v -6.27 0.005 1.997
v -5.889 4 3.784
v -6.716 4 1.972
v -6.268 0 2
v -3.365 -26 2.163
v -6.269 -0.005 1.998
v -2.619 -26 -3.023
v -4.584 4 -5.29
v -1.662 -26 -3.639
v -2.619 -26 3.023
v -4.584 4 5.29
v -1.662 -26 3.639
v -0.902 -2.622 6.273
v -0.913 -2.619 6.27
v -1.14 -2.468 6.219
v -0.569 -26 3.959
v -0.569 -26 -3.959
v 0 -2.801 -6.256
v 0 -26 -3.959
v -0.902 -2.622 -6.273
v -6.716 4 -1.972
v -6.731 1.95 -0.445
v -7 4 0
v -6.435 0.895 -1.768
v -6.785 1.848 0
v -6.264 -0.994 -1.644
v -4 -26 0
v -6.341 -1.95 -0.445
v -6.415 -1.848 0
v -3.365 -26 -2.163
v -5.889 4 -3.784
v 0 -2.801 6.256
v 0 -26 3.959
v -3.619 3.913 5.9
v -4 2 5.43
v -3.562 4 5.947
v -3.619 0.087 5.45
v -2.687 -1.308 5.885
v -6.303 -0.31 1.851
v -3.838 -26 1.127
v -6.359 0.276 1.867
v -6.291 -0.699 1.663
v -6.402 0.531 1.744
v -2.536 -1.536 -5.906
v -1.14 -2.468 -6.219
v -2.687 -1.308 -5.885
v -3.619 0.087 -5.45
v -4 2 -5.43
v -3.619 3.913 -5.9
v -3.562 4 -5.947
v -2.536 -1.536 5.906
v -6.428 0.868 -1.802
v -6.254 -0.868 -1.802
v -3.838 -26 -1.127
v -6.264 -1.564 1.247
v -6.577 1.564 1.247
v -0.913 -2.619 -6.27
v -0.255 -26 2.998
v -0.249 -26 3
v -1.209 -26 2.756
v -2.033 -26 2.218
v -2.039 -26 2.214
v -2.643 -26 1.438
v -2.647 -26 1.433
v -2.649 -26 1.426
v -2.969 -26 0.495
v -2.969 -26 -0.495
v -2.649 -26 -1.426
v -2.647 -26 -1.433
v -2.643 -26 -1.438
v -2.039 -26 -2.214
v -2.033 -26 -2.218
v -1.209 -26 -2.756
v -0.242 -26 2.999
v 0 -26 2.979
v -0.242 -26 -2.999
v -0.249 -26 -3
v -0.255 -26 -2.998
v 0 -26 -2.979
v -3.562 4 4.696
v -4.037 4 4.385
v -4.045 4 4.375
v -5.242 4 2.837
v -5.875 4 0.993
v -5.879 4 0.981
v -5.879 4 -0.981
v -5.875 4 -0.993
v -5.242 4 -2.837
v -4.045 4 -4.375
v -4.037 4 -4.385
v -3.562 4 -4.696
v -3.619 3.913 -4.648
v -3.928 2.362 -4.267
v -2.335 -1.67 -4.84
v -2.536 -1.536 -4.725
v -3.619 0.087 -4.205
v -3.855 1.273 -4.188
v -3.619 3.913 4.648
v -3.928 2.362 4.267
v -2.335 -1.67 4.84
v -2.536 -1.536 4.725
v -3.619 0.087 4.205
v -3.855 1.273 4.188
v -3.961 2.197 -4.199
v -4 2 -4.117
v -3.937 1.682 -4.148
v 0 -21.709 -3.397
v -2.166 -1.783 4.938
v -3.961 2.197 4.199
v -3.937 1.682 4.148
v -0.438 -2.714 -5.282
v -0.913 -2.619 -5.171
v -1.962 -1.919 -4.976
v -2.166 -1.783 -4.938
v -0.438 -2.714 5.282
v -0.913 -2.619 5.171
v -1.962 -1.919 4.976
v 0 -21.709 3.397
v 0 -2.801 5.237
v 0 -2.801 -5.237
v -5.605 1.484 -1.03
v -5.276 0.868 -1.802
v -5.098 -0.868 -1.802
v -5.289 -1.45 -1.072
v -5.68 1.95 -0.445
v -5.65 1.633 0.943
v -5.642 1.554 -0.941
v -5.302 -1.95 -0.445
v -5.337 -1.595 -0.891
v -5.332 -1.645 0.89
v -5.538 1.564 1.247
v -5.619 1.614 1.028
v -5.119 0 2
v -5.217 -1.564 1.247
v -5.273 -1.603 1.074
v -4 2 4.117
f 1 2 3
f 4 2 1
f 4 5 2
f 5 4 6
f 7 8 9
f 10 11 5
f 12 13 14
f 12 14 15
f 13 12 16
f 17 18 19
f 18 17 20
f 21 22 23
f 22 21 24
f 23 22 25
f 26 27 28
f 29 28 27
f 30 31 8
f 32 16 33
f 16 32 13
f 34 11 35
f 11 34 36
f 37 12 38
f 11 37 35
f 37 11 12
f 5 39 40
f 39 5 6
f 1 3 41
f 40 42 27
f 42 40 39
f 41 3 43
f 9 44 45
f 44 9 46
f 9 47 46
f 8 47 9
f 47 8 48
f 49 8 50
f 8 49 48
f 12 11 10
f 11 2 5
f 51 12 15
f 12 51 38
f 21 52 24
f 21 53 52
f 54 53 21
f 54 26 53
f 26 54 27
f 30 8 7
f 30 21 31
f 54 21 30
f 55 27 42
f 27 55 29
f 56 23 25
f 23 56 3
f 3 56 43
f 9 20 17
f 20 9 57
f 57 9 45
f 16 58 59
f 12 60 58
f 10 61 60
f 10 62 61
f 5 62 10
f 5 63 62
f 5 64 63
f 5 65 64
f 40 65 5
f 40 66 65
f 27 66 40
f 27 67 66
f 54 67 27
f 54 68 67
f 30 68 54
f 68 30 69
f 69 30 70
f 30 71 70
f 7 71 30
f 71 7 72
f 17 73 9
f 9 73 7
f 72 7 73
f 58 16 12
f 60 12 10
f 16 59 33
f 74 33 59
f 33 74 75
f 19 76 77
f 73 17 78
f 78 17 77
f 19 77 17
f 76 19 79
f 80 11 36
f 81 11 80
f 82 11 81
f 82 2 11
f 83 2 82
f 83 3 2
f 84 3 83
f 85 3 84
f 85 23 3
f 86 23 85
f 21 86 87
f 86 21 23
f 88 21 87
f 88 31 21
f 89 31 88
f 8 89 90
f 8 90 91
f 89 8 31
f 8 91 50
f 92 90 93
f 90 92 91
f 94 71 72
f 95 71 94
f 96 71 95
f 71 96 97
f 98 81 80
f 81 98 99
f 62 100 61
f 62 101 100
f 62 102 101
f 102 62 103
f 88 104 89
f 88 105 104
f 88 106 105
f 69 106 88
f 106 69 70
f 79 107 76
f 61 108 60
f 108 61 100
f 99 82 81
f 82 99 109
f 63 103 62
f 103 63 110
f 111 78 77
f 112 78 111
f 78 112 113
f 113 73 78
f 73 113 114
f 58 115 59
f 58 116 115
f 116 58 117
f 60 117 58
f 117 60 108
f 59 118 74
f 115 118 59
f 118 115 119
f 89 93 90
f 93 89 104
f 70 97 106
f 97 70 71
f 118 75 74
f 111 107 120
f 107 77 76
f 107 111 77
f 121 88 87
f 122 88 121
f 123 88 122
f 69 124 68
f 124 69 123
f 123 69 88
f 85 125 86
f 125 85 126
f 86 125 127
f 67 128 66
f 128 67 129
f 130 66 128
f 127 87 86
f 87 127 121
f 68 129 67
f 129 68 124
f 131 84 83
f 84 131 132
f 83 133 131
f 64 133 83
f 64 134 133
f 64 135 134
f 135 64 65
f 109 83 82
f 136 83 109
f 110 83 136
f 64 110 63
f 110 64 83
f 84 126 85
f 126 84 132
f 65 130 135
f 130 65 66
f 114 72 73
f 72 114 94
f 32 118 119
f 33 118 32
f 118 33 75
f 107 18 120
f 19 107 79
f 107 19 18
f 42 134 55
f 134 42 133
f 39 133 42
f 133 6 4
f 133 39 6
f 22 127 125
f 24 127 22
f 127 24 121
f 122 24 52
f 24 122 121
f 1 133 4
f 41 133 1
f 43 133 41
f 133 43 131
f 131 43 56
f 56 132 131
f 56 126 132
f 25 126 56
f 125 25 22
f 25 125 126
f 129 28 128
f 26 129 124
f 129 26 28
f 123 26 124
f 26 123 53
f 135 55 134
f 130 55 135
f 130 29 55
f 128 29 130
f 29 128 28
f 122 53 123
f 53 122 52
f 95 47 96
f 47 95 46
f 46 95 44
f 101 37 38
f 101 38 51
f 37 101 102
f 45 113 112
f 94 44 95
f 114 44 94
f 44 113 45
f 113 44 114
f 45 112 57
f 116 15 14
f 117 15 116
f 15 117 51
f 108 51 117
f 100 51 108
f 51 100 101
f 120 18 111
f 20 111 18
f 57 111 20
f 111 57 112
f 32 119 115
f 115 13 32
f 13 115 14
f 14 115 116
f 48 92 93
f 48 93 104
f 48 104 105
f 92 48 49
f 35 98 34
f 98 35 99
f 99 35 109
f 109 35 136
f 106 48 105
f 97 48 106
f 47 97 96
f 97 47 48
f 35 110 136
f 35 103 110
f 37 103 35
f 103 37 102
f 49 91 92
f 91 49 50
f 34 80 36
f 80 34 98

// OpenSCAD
//Variables de creacion.
Longitude=30; // [20:30]
rad_wrist=3; // [2:6]
rad_elbow=6; // [4:10]
thick=1; // [0.5:5]
rjoint=2; // [0.5:4]
Rarm=5; // [5:30]

module Shell(L,r_w,r_e,thick,rj){
difference() {
	translate([0,-L+rj+2,0])rotate([-90,0,0]) cylinder(L,r_w+thick,r_e+thick);
	translate([0,-L+rj+1.9,0])rotate([-90,0,0]) cylinder(L+0.5,r_w,r_e);
}}

//Cono hueco;
//Creamos un cono exterior con un grosor añadido y le quitamos el cono interior.
//Shell(Longitude,rad_wrist,rad_elbow,thick);

//Cortamos por la mitad

/*difference(){
	Shell(Longitude,rad_wrist,rad_elbow,thick,rjoint);
	translate([0,-70,-20])cube([50,100,50]);
	translate([10,0,0])rotate([0,-90,0]) cylinder(20,rjoint,rjoint);
	translate([10-rad_wrist-thick,2,-20])cylinder(50,10,10);
}*/

//translate([rad_wrist+thick+2,2,-40])cylinder(80,10,10);

module Shelly(L,r_w,r_e,thick,rj,rspatial){
	difference(){
		Shell(L,r_w,r_e,thick,rj);
		translate([0,-70,-20])cube([50,100,50]);
		translate([10,0,0])rotate([0,-90,0]) cylinder(20,rjoint,rjoint);
		translate([rspatial-rad_wrist-thick,2,-20])cylinder(50,rspatial,rspatial);
	}
}

Shelly(Longitude,rad_wrist,rad_elbow,thick,rjoint,Rarm);
